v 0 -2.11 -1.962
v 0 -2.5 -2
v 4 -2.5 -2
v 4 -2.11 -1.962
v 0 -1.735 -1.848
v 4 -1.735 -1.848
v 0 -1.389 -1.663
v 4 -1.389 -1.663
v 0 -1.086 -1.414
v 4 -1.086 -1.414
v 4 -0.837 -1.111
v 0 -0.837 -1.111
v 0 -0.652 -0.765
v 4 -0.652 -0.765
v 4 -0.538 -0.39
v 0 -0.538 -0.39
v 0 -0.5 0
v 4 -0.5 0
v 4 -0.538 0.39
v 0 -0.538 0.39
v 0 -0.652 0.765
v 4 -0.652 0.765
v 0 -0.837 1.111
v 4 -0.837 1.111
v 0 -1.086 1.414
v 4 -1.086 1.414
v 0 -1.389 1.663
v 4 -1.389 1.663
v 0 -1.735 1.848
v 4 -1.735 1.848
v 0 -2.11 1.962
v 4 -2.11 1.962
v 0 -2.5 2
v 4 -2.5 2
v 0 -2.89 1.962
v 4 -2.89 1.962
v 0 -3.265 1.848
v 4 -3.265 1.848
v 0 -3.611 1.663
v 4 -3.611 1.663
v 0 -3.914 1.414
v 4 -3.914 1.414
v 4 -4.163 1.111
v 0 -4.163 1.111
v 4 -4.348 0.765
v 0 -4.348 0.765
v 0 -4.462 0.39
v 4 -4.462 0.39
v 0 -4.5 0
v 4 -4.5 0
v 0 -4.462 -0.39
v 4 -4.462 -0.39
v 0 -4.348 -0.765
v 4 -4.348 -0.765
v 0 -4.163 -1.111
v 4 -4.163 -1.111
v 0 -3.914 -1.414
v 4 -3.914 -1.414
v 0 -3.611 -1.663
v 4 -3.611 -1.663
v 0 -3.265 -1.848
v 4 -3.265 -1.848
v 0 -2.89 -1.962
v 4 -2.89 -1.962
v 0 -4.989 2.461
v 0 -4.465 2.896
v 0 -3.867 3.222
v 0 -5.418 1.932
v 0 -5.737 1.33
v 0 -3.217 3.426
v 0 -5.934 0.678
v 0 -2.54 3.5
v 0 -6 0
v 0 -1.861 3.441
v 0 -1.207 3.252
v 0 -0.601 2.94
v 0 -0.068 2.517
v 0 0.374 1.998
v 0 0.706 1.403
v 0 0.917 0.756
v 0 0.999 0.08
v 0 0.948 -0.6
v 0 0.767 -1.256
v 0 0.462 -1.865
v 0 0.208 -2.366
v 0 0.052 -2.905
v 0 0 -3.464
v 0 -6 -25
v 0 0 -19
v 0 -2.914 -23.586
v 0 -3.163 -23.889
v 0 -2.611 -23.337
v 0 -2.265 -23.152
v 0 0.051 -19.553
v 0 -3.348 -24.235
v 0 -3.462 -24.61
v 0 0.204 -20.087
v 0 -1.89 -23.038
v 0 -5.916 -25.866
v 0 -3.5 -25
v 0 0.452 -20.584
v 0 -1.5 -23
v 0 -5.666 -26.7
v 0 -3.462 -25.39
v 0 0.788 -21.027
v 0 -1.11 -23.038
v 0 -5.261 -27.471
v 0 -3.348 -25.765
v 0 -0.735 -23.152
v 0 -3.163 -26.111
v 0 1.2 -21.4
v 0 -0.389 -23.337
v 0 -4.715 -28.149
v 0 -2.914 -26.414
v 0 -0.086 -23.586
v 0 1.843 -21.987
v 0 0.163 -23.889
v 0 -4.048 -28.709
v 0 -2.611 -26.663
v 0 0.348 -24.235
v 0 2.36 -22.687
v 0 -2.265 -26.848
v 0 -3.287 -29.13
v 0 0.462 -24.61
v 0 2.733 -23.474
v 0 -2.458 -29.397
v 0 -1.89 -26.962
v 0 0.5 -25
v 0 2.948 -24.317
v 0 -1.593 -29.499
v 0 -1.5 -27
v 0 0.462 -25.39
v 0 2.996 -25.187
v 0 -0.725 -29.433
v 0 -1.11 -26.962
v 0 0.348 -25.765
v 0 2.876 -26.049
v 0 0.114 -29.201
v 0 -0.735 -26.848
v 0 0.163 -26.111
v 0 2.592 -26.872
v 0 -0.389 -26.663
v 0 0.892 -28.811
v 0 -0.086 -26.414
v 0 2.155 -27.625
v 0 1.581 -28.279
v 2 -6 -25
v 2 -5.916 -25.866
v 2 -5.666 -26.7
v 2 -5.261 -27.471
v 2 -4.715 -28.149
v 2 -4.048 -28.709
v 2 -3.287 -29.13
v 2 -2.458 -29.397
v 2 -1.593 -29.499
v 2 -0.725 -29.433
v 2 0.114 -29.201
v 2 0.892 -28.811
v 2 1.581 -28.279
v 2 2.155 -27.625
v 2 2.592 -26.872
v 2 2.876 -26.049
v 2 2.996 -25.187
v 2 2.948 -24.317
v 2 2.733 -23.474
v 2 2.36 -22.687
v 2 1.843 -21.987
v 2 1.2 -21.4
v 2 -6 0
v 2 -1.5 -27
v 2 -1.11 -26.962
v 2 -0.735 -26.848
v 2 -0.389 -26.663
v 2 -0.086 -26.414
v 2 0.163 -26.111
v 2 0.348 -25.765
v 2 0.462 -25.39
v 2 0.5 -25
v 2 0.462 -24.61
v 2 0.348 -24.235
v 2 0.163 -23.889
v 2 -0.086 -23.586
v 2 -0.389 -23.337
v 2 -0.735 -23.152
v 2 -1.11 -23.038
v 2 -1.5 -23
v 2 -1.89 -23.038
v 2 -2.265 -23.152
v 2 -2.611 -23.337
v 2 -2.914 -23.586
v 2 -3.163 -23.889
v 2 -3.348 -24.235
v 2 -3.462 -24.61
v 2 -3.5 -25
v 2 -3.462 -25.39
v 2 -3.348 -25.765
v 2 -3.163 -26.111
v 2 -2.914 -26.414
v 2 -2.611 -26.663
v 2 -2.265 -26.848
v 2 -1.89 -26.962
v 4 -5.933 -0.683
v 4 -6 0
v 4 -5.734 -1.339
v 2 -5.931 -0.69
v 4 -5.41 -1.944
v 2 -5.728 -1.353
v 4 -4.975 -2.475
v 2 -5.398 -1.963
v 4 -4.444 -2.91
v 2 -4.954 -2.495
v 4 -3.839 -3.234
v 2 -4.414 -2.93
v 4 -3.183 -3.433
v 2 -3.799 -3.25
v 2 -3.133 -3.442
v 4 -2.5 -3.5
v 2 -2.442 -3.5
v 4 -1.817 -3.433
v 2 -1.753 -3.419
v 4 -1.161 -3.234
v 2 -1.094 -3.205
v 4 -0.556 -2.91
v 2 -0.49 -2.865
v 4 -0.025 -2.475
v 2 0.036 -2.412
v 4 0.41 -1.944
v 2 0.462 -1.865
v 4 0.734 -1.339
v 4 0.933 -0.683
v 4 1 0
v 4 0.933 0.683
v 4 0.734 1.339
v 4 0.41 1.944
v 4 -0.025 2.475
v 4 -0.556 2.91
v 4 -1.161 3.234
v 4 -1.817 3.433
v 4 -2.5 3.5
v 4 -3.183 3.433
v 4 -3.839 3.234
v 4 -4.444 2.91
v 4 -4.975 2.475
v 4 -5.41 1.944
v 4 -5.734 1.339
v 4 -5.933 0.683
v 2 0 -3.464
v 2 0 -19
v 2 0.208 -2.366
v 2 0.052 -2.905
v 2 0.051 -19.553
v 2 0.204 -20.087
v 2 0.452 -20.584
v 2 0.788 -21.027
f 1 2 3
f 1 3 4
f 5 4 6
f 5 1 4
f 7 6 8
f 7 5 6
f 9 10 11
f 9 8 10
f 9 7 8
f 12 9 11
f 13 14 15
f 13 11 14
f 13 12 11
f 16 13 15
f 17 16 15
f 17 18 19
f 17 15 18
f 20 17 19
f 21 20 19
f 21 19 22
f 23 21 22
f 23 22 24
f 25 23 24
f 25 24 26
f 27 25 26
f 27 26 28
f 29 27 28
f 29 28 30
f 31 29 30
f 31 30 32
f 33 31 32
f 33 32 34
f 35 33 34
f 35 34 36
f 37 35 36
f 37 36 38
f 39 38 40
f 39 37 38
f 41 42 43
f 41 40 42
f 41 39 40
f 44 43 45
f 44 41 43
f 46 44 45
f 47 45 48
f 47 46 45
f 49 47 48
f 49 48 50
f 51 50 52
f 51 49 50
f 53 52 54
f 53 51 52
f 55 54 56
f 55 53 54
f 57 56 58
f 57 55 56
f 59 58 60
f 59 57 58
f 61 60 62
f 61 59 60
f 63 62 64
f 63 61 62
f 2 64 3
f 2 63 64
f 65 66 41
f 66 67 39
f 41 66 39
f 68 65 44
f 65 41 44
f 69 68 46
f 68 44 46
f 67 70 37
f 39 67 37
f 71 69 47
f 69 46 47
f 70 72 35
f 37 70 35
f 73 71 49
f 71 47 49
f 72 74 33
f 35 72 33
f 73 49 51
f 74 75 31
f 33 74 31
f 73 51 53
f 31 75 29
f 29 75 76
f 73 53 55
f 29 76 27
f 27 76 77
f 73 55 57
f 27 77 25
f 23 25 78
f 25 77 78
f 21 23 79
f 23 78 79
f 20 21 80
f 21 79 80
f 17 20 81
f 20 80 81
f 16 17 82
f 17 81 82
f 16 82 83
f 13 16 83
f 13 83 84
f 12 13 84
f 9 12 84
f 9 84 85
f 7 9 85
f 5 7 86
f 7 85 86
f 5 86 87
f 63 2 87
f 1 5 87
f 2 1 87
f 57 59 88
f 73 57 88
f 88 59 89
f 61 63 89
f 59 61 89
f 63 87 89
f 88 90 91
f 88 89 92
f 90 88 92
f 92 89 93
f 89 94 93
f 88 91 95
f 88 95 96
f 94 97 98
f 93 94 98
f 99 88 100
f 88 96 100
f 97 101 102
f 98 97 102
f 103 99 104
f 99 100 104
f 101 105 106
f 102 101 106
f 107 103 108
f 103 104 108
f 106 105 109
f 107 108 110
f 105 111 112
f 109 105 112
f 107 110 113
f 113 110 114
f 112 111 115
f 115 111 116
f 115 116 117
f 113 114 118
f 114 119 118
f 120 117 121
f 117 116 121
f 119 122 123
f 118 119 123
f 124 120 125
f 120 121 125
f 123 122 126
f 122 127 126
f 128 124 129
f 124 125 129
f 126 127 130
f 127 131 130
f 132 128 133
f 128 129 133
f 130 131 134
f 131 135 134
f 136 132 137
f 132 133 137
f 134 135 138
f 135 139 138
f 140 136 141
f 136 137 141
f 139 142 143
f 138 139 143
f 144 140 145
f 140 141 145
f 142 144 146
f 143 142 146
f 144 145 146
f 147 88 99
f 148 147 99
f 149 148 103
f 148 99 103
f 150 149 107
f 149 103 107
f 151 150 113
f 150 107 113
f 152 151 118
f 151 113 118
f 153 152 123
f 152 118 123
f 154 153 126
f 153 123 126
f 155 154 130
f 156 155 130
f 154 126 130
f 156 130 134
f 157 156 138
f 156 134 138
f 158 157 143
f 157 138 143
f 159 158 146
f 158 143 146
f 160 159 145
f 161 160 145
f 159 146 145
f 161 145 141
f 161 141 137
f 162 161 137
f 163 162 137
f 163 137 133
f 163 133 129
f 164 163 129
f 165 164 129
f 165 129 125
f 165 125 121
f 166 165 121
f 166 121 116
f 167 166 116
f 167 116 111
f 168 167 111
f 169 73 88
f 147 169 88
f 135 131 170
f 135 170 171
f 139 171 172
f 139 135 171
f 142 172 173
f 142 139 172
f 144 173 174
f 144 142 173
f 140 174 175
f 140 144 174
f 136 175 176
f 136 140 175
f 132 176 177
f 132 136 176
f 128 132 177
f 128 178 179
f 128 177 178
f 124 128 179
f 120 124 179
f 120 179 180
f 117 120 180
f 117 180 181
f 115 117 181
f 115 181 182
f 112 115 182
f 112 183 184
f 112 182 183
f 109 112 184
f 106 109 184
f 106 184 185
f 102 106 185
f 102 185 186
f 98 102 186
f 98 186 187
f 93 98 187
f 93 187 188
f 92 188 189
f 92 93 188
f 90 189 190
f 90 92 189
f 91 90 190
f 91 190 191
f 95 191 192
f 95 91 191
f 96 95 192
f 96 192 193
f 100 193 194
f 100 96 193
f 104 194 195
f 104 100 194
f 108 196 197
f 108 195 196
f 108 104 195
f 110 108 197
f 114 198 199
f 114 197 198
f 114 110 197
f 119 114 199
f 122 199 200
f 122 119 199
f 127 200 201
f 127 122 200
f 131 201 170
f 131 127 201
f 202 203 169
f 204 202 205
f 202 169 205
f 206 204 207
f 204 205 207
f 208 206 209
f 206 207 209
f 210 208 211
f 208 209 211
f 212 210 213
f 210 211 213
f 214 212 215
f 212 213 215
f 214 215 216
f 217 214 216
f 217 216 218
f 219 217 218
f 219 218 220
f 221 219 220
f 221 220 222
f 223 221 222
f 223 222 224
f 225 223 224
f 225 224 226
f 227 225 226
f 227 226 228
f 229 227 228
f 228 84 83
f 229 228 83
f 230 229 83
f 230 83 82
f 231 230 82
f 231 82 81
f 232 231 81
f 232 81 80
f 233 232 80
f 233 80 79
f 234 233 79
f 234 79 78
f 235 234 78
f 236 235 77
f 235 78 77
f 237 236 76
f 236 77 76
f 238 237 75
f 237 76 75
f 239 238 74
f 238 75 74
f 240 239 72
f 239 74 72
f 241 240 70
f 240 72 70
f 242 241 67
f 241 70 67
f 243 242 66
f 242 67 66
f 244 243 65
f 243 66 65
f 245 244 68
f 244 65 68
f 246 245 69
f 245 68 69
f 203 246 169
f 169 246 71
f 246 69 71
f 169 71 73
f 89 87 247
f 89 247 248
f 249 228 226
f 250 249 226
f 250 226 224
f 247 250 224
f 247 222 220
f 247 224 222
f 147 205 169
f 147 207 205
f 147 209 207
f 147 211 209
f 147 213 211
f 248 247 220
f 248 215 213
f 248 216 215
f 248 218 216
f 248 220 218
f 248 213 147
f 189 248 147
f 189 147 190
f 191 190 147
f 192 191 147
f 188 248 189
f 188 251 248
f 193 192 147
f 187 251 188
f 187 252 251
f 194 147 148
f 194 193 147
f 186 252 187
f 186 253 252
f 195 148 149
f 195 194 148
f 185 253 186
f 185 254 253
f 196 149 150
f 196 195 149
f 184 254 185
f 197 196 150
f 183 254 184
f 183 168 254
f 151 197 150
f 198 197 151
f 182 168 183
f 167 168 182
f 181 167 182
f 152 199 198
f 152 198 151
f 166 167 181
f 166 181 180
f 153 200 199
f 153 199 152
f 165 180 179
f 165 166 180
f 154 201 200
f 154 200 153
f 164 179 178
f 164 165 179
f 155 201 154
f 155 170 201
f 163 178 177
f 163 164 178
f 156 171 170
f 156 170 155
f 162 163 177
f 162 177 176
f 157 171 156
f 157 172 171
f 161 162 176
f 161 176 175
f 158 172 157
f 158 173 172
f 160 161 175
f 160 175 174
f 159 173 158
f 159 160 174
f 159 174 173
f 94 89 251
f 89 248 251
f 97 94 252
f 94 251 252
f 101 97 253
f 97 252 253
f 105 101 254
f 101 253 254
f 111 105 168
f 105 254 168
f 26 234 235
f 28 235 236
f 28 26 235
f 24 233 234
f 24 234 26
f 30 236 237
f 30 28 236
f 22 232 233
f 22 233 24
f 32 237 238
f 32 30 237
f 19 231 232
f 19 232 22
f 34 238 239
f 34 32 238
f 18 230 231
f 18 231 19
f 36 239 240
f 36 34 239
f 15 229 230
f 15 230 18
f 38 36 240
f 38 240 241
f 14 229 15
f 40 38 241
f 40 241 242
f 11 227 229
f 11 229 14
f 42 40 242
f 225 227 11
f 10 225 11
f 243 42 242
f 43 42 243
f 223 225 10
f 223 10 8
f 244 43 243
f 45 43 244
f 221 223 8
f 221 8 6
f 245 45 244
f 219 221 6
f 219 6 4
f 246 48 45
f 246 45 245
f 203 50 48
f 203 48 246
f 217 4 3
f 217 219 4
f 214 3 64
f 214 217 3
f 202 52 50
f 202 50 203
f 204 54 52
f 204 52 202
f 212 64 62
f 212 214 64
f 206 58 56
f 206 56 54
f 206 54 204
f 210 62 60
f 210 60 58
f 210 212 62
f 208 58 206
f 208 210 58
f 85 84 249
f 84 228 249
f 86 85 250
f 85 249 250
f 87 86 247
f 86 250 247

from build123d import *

# Parameters (mm, degrees)
SKETCH_1_R               = 3.5
SKETCH_1_R_2             = 4.5
SKETCH_1_W               = 25
SKETCH_1_H               = 6
EXTRUDE_1_DEPTH          = 2
EXTRUDE_START            = 2
SKETCH_1_5_R             = 3.5
EXTRUDE_3_DEPTH          = 2
CUT_EXTRUDE_2_DEPTH      = 31.368569278
CUT_EXTRUDE_2_DEPTH_BACK = 31.368569278
SKETCH_1_4_R             = 2
FILLET_1_R               = 3


with BuildPart() as part:
    # 草图1 → 凸台-拉伸1 (new body)
    with BuildSketch(Plane(origin=(0, 0, 0), x_dir=(0, 0, -1), z_dir=(1, 0, 0))):
        with Locations((0, -2.5)):
            Circle(SKETCH_1_R)
        with Locations((25, -1.5)):
            Circle(SKETCH_1_R_2)
        with Locations((12.5, -3)):
            Rectangle(SKETCH_1_W, SKETCH_1_H)
    extrude(amount=EXTRUDE_1_DEPTH)

    # 草图1<5> → 凸台-拉伸3 (add)
    with BuildSketch(Plane(origin=(0, 0, 0), x_dir=(0, 0, -1), z_dir=(1, 0, 0)).offset(EXTRUDE_START)):
        with Locations(Location((0, -2.5, 0), (0, 0, 270))):
            Circle(SKETCH_1_5_R)
    extrude(amount=EXTRUDE_3_DEPTH)

    # 草图1<4> → 切除-拉伸2 (cut, two sides: drawn at the far end of the back side and taken through both)
    with BuildSketch(Plane(origin=(0, 0, 0), x_dir=(0, 0, -1), z_dir=(1, 0, 0)).offset(-CUT_EXTRUDE_2_DEPTH_BACK)):
        with Locations((0, -2.5)):
            Circle(SKETCH_1_4_R)
        with Locations((25, -1.5)):
            Circle(SKETCH_1_4_R)
    extrude(amount=CUT_EXTRUDE_2_DEPTH + CUT_EXTRUDE_2_DEPTH_BACK, mode=Mode.SUBTRACT)

    # 圆角1
    fillet_1_edges = [part.edges().sort_by_distance(p)[0] for p in [
        (1, 0, -20.757359313),
        (1, 0, -2.449489743),
    ]]
    fillet(fillet_1_edges, radius=FILLET_1_R)


solid = part.part
